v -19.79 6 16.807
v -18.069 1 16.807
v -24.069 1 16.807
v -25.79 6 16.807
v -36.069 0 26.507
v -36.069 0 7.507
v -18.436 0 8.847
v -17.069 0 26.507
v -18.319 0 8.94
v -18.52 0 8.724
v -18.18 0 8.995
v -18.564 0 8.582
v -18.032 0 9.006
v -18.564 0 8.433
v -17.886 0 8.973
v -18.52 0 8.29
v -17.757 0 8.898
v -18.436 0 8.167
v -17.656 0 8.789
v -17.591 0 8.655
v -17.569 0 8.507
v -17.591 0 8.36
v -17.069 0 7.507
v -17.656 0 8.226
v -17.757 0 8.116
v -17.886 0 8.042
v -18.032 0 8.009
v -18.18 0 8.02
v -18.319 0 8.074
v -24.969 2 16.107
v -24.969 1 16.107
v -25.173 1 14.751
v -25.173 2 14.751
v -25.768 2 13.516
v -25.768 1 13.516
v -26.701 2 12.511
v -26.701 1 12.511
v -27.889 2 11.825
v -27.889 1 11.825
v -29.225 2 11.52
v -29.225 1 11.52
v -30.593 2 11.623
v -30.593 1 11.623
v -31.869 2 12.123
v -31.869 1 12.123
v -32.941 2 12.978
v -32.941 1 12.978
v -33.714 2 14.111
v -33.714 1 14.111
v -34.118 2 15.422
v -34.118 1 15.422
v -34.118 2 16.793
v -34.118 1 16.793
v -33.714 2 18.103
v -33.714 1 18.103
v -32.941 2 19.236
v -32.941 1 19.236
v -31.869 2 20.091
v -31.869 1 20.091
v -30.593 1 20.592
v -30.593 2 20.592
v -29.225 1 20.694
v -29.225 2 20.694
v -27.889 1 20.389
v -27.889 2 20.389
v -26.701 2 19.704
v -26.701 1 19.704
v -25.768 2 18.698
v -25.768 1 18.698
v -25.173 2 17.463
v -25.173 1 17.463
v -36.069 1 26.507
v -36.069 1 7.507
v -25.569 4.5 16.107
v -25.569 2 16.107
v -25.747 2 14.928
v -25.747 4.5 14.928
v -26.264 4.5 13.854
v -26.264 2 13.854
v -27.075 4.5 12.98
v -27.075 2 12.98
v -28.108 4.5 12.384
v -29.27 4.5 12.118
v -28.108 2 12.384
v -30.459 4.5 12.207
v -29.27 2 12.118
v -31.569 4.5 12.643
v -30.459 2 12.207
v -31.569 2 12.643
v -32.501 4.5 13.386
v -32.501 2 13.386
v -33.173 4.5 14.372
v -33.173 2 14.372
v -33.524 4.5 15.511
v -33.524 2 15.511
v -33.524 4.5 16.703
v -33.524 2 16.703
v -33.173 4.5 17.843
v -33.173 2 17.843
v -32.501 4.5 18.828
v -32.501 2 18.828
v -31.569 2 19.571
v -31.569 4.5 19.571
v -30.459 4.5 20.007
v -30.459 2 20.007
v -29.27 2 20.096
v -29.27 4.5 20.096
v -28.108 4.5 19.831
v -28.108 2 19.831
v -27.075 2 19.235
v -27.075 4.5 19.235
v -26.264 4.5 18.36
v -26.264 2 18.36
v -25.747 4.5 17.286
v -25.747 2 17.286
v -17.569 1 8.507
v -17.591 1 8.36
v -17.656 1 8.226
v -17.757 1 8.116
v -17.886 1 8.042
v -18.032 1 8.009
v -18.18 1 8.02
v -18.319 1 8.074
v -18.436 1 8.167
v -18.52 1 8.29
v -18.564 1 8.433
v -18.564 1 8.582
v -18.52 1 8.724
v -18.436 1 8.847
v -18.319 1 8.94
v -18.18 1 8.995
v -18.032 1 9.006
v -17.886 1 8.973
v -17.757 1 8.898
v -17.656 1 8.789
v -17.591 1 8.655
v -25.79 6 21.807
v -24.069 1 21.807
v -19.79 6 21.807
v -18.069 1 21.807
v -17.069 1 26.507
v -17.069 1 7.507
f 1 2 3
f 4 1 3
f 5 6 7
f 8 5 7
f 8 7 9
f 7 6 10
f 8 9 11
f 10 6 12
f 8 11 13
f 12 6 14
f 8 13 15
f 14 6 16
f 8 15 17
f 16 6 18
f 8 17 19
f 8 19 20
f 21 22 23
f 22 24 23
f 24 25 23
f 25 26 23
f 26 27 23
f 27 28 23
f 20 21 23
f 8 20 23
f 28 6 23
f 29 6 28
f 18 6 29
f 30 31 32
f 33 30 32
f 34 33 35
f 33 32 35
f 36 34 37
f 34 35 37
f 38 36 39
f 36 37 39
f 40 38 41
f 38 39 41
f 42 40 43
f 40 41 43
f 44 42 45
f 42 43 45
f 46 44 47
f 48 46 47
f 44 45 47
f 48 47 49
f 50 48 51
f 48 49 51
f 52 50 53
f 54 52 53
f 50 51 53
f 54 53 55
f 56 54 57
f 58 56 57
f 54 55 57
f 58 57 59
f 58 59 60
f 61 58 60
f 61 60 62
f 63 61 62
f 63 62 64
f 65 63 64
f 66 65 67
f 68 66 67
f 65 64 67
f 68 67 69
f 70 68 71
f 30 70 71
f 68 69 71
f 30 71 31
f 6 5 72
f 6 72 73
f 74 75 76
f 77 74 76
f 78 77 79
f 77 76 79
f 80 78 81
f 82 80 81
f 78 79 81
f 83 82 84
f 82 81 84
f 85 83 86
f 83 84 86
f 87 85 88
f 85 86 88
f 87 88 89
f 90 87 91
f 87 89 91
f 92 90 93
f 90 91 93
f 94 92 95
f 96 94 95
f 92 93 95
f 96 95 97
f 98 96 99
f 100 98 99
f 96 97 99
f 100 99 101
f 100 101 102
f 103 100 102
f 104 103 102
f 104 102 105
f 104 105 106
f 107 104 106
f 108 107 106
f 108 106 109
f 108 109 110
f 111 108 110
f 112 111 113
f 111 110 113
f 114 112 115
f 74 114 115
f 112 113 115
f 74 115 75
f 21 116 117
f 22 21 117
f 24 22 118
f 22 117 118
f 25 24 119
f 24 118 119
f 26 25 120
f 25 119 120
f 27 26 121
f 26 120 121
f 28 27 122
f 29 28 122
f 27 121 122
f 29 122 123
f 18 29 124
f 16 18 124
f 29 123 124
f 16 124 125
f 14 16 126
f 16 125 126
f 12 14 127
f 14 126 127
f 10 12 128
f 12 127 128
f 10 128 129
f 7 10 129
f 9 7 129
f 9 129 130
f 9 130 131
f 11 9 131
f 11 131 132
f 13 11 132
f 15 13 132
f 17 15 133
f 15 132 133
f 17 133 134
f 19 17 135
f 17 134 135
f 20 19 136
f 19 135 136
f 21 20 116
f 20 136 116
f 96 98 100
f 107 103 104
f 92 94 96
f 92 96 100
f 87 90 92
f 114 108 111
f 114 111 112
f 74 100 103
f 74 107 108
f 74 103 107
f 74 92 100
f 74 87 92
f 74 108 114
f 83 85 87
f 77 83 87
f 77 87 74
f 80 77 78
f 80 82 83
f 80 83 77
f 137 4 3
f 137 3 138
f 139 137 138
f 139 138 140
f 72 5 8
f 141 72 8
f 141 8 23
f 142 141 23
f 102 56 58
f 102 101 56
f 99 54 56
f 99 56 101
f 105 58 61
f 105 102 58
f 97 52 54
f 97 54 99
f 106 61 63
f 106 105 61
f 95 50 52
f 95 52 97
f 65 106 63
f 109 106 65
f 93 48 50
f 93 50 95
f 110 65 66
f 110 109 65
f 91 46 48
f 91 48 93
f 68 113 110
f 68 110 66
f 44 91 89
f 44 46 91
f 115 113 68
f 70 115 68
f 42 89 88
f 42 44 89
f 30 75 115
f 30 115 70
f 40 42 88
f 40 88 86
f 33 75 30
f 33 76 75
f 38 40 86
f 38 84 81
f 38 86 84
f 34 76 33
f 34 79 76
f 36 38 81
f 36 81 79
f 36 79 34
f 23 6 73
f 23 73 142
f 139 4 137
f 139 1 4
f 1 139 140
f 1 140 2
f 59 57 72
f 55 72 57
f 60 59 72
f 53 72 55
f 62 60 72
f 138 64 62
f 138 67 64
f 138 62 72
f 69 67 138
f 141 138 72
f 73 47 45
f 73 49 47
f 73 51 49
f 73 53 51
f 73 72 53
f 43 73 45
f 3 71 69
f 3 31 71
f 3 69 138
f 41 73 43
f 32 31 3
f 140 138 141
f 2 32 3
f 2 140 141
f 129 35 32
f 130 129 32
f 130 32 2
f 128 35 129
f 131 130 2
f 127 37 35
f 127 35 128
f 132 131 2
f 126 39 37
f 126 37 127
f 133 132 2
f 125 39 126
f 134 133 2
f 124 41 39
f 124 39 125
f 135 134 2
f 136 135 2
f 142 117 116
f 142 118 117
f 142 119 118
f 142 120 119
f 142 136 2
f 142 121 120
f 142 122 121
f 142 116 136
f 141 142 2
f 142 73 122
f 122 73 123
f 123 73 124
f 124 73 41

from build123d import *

# Parameters (mm, degrees)
SKETCH_1_W          = 19
SKETCH_1_H          = 19
EXTRUDE_1_DEPTH     = 1
SKETCH_2_R          = 0.5
CUT_EXTRUDE_1_DEPTH = 1
SKETCH_3_R          = 4.6
EXTRUDE_2_DEPTH     = 1
SKETCH_5_R          = 4
EXTRUDE_3_DEPTH     = 2.5
SKETCH_6_W          = 6
SKETCH_6_H          = 5


with BuildPart() as part:
    # Эскиз1 → Бобышка-Вытянуть1 (new body)
    with BuildSketch(Plane(origin=(0, 0, 0), x_dir=(1, 0, 0), z_dir=(0, 1, 0))):
        with Locations((-26.569127832, -17.007177836)):
            Rectangle(SKETCH_1_W, SKETCH_1_H)
    extrude(amount=EXTRUDE_1_DEPTH)

    # Эскиз2 → Вырез-Вытянуть1 (cut)
    with BuildSketch(Plane(origin=(0, 1, 0), x_dir=(1, 0, 0), z_dir=(0, 1, 0))):
        with Locations((-18.069127832, -8.507177836)):
            Circle(SKETCH_2_R)
    extrude(amount=-CUT_EXTRUDE_1_DEPTH, mode=Mode.SUBTRACT)

    # Эскиз3 → Бобышка-Вытянуть2 (add)
    with BuildSketch(Plane(origin=(0, 1, 0), x_dir=(1, 0, 0), z_dir=(0, 1, 0))):
        with Locations((-29.569127832, -16.107177836)):
            Circle(SKETCH_3_R)
    extrude(amount=EXTRUDE_2_DEPTH)

    # Эскиз5 → Бобышка-Вытянуть3 (add)
    with BuildSketch(Plane(origin=(0, 2, 0), x_dir=(1, 0, 0), z_dir=(0, 1, 0))):
        with Locations((-29.569127832, -16.107177836)):
            Circle(SKETCH_5_R)
    extrude(amount=EXTRUDE_3_DEPTH)

    # По траектории1: sweep along a path in Эскиз9
    with BuildLine(Plane.XY) as sweep_1_path:
        Line((-24.069127832, 1), (-25.789600147, 6))
    # Эскиз6 → По траектории1 (sweep)
    with BuildSketch(Plane(origin=(0, 1, 0), x_dir=(1, 0, 0), z_dir=(0, 1, 0))):
        with Locations((-21.069127832, -19.307177836)):
            Rectangle(SKETCH_6_W, SKETCH_6_H)
    sweep(path=sweep_1_path.line)


solid = part.part
